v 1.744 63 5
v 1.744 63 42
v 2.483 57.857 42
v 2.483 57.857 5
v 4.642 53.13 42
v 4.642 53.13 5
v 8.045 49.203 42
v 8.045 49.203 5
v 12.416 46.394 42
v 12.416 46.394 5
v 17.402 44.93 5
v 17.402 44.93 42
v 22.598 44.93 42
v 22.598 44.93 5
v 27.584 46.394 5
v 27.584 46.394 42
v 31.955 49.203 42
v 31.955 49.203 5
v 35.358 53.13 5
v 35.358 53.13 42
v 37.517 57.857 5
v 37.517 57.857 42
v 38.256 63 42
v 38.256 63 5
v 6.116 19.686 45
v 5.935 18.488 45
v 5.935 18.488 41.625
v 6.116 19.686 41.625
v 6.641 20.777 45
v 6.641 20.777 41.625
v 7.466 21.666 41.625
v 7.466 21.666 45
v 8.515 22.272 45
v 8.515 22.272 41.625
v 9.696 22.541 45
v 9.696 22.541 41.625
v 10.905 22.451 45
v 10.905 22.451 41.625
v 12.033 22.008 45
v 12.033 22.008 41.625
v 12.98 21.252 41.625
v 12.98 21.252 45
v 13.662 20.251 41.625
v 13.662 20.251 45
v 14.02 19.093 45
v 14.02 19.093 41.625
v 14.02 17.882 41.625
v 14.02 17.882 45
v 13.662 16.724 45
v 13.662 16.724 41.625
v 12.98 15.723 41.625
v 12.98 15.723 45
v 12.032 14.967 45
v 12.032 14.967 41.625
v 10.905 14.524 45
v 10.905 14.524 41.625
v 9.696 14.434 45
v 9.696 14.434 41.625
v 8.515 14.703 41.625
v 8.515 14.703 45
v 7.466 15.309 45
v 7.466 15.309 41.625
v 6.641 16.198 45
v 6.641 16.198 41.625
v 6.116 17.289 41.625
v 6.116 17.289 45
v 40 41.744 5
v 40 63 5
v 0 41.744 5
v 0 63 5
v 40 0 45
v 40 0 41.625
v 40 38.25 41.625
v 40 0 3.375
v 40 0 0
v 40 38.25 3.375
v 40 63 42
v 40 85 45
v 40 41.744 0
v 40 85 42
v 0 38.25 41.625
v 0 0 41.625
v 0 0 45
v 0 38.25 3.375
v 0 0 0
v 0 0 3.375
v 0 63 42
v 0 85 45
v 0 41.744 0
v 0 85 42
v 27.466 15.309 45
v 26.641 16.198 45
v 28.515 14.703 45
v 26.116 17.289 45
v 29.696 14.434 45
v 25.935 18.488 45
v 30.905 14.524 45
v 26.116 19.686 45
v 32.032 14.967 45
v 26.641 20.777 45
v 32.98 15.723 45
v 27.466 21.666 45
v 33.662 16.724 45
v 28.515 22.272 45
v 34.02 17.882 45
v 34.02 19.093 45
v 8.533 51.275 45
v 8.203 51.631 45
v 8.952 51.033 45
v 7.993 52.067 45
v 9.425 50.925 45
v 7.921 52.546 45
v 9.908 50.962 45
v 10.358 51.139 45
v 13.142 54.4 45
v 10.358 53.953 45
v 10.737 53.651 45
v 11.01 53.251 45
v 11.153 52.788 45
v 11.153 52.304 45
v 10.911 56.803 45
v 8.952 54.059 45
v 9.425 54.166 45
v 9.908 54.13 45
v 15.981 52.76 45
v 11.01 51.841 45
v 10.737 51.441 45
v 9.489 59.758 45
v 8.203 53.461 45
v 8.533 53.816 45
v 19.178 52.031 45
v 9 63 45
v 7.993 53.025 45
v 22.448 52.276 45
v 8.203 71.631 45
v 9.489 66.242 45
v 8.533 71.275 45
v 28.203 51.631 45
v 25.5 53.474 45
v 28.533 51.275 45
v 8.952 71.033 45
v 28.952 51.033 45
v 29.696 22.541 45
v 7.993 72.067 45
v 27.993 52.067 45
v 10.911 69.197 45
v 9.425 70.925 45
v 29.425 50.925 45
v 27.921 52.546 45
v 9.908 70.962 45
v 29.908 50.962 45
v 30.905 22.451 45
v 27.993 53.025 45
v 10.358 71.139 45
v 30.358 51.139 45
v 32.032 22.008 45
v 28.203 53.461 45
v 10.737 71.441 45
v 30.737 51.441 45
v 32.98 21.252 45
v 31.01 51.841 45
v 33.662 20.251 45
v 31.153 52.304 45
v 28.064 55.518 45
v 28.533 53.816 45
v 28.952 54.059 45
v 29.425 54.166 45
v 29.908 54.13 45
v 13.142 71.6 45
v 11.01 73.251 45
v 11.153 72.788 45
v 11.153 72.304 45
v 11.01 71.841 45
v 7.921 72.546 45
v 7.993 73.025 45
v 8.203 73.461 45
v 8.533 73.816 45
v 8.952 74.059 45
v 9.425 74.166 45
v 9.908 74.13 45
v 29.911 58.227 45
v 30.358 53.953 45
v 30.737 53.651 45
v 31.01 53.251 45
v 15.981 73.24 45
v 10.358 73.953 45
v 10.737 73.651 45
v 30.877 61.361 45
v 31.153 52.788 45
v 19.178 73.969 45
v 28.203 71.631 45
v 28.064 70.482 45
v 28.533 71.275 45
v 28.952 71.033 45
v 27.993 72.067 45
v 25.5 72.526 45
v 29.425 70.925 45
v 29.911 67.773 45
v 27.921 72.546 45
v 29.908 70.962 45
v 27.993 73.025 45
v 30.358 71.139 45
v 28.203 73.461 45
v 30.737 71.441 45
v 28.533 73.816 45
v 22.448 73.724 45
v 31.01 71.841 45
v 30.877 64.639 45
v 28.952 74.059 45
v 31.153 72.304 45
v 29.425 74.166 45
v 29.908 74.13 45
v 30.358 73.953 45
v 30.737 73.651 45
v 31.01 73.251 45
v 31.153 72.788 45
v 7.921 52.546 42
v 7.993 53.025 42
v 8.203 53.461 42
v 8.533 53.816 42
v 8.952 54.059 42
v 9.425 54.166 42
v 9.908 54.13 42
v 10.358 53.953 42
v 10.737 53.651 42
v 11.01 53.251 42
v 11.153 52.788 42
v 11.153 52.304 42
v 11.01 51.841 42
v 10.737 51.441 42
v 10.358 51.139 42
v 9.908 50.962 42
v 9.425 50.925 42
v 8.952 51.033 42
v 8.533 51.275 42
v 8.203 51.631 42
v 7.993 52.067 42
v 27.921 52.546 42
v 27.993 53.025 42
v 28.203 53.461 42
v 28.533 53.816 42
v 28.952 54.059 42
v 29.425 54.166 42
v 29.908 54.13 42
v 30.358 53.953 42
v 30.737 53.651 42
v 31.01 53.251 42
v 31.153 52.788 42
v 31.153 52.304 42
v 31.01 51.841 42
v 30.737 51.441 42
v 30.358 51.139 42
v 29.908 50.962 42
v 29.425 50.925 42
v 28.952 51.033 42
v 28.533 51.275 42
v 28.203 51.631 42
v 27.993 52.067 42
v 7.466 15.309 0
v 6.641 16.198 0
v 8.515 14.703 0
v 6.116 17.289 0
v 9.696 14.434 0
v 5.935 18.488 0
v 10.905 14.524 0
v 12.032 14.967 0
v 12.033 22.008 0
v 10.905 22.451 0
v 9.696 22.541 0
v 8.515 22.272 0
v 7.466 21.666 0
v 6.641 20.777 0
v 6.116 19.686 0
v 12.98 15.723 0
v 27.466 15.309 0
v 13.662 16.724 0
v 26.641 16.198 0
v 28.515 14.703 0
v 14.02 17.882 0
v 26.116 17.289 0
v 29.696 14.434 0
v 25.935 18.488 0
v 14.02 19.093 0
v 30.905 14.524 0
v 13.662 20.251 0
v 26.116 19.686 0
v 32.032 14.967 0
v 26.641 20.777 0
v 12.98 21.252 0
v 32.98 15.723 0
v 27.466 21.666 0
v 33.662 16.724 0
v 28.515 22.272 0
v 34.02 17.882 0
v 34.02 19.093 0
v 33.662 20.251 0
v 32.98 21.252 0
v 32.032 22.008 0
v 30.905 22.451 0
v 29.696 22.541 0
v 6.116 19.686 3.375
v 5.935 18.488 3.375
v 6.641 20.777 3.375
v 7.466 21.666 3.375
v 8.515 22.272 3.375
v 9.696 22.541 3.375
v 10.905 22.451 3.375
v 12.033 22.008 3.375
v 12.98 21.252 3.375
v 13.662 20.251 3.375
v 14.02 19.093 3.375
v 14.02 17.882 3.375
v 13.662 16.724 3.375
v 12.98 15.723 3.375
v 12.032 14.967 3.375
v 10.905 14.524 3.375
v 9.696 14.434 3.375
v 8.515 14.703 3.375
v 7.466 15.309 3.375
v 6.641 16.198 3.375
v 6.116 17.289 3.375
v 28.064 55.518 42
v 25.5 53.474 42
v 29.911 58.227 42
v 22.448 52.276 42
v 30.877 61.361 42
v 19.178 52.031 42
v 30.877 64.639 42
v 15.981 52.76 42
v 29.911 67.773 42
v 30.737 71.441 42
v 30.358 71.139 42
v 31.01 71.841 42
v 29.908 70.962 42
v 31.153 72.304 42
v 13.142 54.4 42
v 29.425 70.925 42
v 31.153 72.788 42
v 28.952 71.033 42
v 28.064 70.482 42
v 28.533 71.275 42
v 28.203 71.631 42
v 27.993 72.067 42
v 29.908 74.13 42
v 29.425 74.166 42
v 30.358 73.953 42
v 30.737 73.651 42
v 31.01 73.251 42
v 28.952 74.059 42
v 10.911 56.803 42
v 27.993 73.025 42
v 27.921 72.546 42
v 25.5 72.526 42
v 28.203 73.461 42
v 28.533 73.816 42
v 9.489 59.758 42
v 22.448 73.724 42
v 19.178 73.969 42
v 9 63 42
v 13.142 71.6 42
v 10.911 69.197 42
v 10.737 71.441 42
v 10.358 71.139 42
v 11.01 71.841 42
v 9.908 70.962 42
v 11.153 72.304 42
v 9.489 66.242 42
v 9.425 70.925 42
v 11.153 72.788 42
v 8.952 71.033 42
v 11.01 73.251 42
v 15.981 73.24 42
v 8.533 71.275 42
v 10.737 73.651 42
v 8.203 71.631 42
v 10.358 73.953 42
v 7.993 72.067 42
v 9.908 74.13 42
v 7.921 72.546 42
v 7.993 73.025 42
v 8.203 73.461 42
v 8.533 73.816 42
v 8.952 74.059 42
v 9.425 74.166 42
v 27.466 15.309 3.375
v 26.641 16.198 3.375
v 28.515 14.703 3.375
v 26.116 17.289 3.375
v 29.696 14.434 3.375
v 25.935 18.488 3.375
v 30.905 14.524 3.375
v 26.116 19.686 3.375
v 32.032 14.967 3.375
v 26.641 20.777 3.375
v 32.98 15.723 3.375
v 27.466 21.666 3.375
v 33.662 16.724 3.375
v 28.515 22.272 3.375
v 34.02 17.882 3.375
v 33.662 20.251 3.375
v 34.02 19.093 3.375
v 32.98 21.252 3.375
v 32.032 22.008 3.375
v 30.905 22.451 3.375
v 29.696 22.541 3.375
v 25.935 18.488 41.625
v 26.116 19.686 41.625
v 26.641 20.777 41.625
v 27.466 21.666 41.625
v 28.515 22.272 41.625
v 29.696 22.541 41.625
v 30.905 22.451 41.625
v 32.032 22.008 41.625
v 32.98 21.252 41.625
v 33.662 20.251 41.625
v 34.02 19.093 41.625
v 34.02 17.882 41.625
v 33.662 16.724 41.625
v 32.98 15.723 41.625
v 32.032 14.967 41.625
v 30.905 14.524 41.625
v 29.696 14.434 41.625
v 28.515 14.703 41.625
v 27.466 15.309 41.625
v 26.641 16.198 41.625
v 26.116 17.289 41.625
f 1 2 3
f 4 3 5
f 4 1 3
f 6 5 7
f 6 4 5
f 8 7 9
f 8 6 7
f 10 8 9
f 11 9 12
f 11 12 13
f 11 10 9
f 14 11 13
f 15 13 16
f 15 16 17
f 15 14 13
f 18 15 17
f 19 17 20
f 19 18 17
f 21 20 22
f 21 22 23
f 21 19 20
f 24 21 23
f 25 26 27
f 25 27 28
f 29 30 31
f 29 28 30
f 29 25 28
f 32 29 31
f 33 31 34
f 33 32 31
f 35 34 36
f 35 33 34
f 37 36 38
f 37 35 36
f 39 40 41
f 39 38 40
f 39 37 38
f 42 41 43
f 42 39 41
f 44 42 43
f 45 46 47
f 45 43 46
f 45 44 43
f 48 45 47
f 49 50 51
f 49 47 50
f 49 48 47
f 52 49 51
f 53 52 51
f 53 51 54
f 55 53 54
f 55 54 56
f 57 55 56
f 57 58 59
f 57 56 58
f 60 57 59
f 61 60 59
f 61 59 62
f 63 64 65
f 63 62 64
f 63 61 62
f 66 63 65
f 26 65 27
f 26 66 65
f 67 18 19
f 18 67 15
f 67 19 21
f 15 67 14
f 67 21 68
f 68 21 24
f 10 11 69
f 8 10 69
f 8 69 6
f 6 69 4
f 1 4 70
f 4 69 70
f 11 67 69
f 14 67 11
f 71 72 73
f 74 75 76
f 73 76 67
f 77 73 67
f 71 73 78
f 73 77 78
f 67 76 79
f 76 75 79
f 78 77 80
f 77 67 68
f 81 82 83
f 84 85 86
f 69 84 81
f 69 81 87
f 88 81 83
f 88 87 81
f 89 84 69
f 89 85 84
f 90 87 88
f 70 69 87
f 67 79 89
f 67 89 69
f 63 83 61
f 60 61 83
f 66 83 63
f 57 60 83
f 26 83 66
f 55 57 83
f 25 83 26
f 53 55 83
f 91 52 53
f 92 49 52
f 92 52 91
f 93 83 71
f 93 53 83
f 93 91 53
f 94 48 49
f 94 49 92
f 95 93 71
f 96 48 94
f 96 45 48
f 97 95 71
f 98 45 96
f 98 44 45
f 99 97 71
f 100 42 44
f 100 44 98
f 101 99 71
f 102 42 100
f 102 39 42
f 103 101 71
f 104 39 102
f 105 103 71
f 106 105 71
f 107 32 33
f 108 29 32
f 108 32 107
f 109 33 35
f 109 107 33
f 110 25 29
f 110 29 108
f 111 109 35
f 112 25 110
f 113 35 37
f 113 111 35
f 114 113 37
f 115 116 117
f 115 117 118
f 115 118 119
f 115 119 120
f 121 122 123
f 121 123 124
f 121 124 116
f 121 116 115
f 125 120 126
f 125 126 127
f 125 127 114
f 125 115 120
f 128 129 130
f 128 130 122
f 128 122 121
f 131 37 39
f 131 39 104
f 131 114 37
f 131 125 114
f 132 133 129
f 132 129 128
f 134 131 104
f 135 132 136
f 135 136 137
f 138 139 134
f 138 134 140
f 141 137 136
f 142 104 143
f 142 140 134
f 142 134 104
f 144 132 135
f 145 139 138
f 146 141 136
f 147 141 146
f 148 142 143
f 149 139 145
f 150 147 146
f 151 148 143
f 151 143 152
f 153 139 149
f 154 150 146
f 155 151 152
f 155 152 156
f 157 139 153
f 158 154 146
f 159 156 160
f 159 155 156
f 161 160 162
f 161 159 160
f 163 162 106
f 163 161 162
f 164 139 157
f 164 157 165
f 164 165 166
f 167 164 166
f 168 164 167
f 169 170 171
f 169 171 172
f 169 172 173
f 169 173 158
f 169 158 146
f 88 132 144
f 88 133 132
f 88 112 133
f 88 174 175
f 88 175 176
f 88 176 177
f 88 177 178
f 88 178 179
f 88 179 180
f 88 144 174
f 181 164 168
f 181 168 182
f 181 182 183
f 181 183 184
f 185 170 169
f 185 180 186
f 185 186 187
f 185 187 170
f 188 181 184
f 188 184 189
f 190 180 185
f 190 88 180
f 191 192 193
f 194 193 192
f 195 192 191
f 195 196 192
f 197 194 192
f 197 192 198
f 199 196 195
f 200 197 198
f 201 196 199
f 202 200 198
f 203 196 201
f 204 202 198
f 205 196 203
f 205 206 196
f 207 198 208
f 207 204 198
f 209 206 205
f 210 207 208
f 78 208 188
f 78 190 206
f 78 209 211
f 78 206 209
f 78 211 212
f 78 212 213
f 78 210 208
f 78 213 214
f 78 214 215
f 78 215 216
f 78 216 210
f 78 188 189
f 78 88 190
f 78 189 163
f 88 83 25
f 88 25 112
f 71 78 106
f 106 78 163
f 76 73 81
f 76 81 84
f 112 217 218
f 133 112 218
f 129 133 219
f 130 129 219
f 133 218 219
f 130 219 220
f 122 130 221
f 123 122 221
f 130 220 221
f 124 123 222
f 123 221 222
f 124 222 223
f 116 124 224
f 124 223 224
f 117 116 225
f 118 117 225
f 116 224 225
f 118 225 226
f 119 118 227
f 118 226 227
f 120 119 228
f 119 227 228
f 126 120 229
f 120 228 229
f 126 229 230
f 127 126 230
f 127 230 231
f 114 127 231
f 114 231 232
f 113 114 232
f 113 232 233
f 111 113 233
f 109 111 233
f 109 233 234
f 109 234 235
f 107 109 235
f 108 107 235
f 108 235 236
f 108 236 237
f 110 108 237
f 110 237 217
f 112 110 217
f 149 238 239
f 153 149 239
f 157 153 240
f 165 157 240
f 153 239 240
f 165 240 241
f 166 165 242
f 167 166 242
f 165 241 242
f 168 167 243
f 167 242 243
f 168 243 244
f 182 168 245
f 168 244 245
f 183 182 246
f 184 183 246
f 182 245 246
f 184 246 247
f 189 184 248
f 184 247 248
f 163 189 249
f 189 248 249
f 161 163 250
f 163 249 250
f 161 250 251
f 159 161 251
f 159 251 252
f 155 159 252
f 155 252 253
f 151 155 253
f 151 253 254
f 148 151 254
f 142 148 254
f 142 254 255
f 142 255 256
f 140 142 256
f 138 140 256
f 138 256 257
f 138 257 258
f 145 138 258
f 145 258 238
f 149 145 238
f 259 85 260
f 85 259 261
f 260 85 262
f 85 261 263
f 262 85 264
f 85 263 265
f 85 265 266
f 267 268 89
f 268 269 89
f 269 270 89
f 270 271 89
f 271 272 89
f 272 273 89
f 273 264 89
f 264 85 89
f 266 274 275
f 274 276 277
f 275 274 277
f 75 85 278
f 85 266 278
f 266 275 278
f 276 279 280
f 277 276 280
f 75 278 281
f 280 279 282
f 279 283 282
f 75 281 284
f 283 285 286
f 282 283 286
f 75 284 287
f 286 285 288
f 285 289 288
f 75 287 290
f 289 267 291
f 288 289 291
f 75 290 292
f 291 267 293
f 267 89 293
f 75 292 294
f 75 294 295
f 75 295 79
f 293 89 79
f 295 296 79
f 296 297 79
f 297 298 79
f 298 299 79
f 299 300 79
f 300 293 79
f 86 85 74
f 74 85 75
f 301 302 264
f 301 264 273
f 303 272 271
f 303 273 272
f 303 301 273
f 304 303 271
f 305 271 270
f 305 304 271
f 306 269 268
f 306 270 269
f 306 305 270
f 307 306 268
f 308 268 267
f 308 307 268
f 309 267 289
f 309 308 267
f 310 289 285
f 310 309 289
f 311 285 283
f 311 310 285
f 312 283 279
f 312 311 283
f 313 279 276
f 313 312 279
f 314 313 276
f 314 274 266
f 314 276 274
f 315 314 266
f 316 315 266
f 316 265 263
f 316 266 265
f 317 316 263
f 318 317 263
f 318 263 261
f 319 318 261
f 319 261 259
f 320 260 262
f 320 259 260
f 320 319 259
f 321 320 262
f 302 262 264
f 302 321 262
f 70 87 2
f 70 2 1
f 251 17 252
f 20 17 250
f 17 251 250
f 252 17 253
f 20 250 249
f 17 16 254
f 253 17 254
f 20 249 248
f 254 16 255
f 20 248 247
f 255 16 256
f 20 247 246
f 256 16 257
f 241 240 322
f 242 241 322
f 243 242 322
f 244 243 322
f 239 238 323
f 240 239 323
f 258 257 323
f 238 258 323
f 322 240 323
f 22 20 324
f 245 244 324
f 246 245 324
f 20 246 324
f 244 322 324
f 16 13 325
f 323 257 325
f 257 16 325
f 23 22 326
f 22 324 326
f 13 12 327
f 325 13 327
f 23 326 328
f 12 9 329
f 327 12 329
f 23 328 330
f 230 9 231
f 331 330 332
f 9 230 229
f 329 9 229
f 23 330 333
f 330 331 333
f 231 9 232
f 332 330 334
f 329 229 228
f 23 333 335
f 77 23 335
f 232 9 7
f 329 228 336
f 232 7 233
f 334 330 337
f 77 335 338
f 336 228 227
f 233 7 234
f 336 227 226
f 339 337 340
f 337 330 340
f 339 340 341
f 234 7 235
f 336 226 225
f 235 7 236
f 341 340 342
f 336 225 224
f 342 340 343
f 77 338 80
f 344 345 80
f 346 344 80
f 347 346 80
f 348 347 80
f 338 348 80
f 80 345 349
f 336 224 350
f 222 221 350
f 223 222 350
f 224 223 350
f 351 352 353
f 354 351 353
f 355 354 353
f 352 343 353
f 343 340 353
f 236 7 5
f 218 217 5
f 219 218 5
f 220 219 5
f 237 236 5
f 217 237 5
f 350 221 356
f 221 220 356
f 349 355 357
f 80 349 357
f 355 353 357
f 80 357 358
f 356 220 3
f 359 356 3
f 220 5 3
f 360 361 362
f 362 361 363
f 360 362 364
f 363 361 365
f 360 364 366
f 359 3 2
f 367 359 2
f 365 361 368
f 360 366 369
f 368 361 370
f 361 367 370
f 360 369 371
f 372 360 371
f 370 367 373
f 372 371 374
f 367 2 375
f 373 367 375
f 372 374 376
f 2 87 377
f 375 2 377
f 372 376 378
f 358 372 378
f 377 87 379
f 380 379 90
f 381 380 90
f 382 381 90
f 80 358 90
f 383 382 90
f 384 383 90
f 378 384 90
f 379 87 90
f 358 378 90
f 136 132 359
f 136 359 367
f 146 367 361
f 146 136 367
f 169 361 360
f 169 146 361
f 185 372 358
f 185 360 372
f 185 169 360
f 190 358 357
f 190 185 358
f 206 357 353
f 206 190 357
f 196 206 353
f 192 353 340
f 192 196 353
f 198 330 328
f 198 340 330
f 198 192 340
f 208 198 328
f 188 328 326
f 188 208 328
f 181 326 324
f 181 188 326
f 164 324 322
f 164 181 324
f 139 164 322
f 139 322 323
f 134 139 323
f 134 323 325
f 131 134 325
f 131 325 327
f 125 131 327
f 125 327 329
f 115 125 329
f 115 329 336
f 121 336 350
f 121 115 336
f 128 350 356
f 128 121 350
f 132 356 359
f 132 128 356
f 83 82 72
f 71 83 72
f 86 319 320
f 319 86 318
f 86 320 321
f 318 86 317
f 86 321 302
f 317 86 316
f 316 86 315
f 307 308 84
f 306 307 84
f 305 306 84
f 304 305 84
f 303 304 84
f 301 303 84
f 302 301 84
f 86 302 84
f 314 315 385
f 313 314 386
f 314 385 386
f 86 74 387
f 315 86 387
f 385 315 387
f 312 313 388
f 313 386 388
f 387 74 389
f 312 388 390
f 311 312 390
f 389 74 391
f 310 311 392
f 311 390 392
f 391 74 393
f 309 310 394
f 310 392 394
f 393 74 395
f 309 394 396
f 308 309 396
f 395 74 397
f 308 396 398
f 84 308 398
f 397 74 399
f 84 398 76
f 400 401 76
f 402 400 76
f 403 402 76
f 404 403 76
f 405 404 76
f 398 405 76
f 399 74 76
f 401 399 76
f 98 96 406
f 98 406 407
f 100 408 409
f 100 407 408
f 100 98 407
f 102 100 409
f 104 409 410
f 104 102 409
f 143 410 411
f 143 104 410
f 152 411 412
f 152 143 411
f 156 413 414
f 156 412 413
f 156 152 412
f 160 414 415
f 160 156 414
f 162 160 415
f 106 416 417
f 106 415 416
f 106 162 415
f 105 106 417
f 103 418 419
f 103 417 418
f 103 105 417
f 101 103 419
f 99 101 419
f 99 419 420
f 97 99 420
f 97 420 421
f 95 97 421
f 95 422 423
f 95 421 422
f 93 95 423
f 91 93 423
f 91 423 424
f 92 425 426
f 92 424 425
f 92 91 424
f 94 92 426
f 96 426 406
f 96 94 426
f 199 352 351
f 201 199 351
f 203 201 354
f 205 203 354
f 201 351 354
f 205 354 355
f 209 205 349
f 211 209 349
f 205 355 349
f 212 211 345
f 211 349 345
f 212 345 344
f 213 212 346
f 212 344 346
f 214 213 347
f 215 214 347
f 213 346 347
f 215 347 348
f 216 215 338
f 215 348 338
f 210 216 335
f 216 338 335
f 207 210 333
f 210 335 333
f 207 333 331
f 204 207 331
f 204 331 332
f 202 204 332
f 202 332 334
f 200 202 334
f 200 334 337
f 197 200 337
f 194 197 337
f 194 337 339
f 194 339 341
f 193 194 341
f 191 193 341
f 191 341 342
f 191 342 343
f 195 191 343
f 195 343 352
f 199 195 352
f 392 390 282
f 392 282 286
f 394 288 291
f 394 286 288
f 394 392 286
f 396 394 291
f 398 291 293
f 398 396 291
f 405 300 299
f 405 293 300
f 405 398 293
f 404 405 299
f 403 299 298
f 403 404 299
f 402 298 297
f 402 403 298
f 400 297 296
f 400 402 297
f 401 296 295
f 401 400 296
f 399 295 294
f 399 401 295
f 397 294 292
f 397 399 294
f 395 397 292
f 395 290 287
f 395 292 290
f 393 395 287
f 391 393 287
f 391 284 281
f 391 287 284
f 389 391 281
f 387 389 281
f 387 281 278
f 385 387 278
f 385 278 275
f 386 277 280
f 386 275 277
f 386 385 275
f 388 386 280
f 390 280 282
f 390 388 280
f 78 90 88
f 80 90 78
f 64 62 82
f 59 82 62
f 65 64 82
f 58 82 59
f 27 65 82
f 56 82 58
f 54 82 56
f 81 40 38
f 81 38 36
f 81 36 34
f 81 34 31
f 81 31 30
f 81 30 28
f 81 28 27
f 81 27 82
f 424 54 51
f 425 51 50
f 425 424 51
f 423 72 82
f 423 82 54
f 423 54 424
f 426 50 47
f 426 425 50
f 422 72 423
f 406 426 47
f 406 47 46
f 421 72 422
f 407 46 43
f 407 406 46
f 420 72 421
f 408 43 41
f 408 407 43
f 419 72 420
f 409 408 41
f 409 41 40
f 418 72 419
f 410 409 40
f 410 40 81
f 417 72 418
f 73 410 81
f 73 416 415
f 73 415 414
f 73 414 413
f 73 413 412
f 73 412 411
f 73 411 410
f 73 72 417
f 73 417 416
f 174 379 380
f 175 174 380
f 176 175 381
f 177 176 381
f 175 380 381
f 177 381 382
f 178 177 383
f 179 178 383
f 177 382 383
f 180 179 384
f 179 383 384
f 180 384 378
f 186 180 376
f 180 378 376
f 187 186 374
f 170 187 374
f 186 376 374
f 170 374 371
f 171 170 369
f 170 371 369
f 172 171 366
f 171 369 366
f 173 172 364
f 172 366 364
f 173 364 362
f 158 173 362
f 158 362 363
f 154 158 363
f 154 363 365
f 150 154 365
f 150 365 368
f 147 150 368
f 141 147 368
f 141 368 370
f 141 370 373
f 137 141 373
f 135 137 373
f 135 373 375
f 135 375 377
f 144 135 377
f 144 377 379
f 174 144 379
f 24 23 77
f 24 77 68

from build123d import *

# Parameters (mm, degrees)
ESQUISSE1_W                  = 40
ESQUISSE1_H                  = 85
BOSS_EXTRU_1_DEPTH           = 45
ESQUISSE2_W                  = 38.25
ESQUISSE2_H                  = 38.25
ENL_V_MAT_EXTRU_1_DEPTH      = 41.1
ESQUISSE3_W                  = 42
ESQUISSE3_H                  = 22
ENL_V_MAT_EXTRU_2_DEPTH      = 105.16333328
ESQUISSE4_R                  = 18.25625
ENL_V_MAT_EXTRU_3_DEPTH      = 42
ENL_V_MAT_EXTRU_4_DEPTH      = 104.048532255
ENL_V_MAT_EXTRU_4_DEPTH_BACK = 104.048532255
ESQUISSE5_R                  = 11
ESQUISSE6_R                  = 1.625
ENL_V_MAT_EXTRU_5_DEPTH      = 103.902866821
ENL_V_MAT_EXTRU_6_DEPTH      = 103.75038017
ENL_V_MAT_EXTRU_6_DEPTH_BACK = 103.75038017
ESQUISSE7_R                  = 4.065
ESQUISSE8_W                  = 5
ESQUISSE8_H                  = 21.25625
ENL_V_MAT_EXTRU_7_DEPTH      = 105.16333328


with BuildPart() as part:
    # Esquisse1 → Boss.-Extru.1 (new body)
    with BuildSketch(Plane.XY):
        with Locations((20, 42.5)):
            Rectangle(ESQUISSE1_W, ESQUISSE1_H)
    extrude(amount=BOSS_EXTRU_1_DEPTH)

    # Esquisse2 → Enlèv. mat.-Extru.1 (cut)
    with BuildSketch(Plane(origin=(40, 0, 0), x_dir=(0, 0, -1), z_dir=(1, 0, 0))):
        with Locations((-22.5, 19.125)):
            Rectangle(ESQUISSE2_W, ESQUISSE2_H)
    extrude(amount=-ENL_V_MAT_EXTRU_1_DEPTH, mode=Mode.SUBTRACT)

    # Esquisse3 → Enlèv. mat.-Extru.2 (cut, through all)
    with BuildSketch(Plane(origin=(0, 0, 45), x_dir=(0, 0, -1), z_dir=(1, 0, 0))):
        with Locations((24, 74)):
            Rectangle(ESQUISSE3_W, ESQUISSE3_H)
    extrude(amount=ENL_V_MAT_EXTRU_2_DEPTH, mode=Mode.SUBTRACT)

    # Esquisse4 → Enlèv. mat.-Extru.3 (cut)
    with BuildSketch(Plane.XY):
        with Locations((20, 63)):
            Circle(ESQUISSE4_R)
    extrude(amount=ENL_V_MAT_EXTRU_3_DEPTH, mode=Mode.SUBTRACT)

    # Esquisse5 → Enlèv. mat.-Extru.4 (cut, two sides: drawn at the far end of the back side and taken through both)
    with BuildSketch(Plane(origin=(37, 0, 0), x_dir=(-1, 0, 0), z_dir=(0, 0, -1)).offset(-ENL_V_MAT_EXTRU_4_DEPTH_BACK)):
        with Locations((17, 63)):
            Circle(ESQUISSE5_R)
    extrude(amount=ENL_V_MAT_EXTRU_4_DEPTH + ENL_V_MAT_EXTRU_4_DEPTH_BACK, mode=Mode.SUBTRACT)

    # Esquisse6 → Enlèv. mat.-Extru.5 (cut, through all)
    with BuildSketch(Plane(origin=(0, 0, 42), x_dir=(-1, 0, 0), z_dir=(0, 0, -1))):
        with Locations((-29.545941546, 72.545941546)):
            Circle(ESQUISSE6_R)
        with Locations((-29.545941546, 52.545941546)):
            Circle(ESQUISSE6_R)
        with Locations((-9.545941546, 52.545941546)):
            Circle(ESQUISSE6_R)
        with Locations((-9.545941546, 72.545941546)):
            Circle(ESQUISSE6_R)
    extrude(amount=-ENL_V_MAT_EXTRU_5_DEPTH, mode=Mode.SUBTRACT)

    # Esquisse7 → Enlèv. mat.-Extru.6 (cut, two sides: drawn at the far end of the back side and taken through both)
    with BuildSketch(Plane(origin=(0, 0, 41.625), x_dir=(-1, 0, 0), z_dir=(0, 0, -1)).offset(-ENL_V_MAT_EXTRU_6_DEPTH_BACK)):
        with Locations((-10, 18.4875)):
            Circle(ESQUISSE7_R)
        with Locations((-30, 18.4875)):
            Circle(ESQUISSE7_R)
    extrude(amount=ENL_V_MAT_EXTRU_6_DEPTH + ENL_V_MAT_EXTRU_6_DEPTH_BACK, mode=Mode.SUBTRACT)

    # Esquisse8 → Enlèv. mat.-Extru.7 (cut, through all)
    with BuildSketch(Plane.ZY):
        with Locations((2.5, 52.371875)):
            Rectangle(ESQUISSE8_W, ESQUISSE8_H)
    extrude(amount=-ENL_V_MAT_EXTRU_7_DEPTH, mode=Mode.SUBTRACT)


solid = part.part
